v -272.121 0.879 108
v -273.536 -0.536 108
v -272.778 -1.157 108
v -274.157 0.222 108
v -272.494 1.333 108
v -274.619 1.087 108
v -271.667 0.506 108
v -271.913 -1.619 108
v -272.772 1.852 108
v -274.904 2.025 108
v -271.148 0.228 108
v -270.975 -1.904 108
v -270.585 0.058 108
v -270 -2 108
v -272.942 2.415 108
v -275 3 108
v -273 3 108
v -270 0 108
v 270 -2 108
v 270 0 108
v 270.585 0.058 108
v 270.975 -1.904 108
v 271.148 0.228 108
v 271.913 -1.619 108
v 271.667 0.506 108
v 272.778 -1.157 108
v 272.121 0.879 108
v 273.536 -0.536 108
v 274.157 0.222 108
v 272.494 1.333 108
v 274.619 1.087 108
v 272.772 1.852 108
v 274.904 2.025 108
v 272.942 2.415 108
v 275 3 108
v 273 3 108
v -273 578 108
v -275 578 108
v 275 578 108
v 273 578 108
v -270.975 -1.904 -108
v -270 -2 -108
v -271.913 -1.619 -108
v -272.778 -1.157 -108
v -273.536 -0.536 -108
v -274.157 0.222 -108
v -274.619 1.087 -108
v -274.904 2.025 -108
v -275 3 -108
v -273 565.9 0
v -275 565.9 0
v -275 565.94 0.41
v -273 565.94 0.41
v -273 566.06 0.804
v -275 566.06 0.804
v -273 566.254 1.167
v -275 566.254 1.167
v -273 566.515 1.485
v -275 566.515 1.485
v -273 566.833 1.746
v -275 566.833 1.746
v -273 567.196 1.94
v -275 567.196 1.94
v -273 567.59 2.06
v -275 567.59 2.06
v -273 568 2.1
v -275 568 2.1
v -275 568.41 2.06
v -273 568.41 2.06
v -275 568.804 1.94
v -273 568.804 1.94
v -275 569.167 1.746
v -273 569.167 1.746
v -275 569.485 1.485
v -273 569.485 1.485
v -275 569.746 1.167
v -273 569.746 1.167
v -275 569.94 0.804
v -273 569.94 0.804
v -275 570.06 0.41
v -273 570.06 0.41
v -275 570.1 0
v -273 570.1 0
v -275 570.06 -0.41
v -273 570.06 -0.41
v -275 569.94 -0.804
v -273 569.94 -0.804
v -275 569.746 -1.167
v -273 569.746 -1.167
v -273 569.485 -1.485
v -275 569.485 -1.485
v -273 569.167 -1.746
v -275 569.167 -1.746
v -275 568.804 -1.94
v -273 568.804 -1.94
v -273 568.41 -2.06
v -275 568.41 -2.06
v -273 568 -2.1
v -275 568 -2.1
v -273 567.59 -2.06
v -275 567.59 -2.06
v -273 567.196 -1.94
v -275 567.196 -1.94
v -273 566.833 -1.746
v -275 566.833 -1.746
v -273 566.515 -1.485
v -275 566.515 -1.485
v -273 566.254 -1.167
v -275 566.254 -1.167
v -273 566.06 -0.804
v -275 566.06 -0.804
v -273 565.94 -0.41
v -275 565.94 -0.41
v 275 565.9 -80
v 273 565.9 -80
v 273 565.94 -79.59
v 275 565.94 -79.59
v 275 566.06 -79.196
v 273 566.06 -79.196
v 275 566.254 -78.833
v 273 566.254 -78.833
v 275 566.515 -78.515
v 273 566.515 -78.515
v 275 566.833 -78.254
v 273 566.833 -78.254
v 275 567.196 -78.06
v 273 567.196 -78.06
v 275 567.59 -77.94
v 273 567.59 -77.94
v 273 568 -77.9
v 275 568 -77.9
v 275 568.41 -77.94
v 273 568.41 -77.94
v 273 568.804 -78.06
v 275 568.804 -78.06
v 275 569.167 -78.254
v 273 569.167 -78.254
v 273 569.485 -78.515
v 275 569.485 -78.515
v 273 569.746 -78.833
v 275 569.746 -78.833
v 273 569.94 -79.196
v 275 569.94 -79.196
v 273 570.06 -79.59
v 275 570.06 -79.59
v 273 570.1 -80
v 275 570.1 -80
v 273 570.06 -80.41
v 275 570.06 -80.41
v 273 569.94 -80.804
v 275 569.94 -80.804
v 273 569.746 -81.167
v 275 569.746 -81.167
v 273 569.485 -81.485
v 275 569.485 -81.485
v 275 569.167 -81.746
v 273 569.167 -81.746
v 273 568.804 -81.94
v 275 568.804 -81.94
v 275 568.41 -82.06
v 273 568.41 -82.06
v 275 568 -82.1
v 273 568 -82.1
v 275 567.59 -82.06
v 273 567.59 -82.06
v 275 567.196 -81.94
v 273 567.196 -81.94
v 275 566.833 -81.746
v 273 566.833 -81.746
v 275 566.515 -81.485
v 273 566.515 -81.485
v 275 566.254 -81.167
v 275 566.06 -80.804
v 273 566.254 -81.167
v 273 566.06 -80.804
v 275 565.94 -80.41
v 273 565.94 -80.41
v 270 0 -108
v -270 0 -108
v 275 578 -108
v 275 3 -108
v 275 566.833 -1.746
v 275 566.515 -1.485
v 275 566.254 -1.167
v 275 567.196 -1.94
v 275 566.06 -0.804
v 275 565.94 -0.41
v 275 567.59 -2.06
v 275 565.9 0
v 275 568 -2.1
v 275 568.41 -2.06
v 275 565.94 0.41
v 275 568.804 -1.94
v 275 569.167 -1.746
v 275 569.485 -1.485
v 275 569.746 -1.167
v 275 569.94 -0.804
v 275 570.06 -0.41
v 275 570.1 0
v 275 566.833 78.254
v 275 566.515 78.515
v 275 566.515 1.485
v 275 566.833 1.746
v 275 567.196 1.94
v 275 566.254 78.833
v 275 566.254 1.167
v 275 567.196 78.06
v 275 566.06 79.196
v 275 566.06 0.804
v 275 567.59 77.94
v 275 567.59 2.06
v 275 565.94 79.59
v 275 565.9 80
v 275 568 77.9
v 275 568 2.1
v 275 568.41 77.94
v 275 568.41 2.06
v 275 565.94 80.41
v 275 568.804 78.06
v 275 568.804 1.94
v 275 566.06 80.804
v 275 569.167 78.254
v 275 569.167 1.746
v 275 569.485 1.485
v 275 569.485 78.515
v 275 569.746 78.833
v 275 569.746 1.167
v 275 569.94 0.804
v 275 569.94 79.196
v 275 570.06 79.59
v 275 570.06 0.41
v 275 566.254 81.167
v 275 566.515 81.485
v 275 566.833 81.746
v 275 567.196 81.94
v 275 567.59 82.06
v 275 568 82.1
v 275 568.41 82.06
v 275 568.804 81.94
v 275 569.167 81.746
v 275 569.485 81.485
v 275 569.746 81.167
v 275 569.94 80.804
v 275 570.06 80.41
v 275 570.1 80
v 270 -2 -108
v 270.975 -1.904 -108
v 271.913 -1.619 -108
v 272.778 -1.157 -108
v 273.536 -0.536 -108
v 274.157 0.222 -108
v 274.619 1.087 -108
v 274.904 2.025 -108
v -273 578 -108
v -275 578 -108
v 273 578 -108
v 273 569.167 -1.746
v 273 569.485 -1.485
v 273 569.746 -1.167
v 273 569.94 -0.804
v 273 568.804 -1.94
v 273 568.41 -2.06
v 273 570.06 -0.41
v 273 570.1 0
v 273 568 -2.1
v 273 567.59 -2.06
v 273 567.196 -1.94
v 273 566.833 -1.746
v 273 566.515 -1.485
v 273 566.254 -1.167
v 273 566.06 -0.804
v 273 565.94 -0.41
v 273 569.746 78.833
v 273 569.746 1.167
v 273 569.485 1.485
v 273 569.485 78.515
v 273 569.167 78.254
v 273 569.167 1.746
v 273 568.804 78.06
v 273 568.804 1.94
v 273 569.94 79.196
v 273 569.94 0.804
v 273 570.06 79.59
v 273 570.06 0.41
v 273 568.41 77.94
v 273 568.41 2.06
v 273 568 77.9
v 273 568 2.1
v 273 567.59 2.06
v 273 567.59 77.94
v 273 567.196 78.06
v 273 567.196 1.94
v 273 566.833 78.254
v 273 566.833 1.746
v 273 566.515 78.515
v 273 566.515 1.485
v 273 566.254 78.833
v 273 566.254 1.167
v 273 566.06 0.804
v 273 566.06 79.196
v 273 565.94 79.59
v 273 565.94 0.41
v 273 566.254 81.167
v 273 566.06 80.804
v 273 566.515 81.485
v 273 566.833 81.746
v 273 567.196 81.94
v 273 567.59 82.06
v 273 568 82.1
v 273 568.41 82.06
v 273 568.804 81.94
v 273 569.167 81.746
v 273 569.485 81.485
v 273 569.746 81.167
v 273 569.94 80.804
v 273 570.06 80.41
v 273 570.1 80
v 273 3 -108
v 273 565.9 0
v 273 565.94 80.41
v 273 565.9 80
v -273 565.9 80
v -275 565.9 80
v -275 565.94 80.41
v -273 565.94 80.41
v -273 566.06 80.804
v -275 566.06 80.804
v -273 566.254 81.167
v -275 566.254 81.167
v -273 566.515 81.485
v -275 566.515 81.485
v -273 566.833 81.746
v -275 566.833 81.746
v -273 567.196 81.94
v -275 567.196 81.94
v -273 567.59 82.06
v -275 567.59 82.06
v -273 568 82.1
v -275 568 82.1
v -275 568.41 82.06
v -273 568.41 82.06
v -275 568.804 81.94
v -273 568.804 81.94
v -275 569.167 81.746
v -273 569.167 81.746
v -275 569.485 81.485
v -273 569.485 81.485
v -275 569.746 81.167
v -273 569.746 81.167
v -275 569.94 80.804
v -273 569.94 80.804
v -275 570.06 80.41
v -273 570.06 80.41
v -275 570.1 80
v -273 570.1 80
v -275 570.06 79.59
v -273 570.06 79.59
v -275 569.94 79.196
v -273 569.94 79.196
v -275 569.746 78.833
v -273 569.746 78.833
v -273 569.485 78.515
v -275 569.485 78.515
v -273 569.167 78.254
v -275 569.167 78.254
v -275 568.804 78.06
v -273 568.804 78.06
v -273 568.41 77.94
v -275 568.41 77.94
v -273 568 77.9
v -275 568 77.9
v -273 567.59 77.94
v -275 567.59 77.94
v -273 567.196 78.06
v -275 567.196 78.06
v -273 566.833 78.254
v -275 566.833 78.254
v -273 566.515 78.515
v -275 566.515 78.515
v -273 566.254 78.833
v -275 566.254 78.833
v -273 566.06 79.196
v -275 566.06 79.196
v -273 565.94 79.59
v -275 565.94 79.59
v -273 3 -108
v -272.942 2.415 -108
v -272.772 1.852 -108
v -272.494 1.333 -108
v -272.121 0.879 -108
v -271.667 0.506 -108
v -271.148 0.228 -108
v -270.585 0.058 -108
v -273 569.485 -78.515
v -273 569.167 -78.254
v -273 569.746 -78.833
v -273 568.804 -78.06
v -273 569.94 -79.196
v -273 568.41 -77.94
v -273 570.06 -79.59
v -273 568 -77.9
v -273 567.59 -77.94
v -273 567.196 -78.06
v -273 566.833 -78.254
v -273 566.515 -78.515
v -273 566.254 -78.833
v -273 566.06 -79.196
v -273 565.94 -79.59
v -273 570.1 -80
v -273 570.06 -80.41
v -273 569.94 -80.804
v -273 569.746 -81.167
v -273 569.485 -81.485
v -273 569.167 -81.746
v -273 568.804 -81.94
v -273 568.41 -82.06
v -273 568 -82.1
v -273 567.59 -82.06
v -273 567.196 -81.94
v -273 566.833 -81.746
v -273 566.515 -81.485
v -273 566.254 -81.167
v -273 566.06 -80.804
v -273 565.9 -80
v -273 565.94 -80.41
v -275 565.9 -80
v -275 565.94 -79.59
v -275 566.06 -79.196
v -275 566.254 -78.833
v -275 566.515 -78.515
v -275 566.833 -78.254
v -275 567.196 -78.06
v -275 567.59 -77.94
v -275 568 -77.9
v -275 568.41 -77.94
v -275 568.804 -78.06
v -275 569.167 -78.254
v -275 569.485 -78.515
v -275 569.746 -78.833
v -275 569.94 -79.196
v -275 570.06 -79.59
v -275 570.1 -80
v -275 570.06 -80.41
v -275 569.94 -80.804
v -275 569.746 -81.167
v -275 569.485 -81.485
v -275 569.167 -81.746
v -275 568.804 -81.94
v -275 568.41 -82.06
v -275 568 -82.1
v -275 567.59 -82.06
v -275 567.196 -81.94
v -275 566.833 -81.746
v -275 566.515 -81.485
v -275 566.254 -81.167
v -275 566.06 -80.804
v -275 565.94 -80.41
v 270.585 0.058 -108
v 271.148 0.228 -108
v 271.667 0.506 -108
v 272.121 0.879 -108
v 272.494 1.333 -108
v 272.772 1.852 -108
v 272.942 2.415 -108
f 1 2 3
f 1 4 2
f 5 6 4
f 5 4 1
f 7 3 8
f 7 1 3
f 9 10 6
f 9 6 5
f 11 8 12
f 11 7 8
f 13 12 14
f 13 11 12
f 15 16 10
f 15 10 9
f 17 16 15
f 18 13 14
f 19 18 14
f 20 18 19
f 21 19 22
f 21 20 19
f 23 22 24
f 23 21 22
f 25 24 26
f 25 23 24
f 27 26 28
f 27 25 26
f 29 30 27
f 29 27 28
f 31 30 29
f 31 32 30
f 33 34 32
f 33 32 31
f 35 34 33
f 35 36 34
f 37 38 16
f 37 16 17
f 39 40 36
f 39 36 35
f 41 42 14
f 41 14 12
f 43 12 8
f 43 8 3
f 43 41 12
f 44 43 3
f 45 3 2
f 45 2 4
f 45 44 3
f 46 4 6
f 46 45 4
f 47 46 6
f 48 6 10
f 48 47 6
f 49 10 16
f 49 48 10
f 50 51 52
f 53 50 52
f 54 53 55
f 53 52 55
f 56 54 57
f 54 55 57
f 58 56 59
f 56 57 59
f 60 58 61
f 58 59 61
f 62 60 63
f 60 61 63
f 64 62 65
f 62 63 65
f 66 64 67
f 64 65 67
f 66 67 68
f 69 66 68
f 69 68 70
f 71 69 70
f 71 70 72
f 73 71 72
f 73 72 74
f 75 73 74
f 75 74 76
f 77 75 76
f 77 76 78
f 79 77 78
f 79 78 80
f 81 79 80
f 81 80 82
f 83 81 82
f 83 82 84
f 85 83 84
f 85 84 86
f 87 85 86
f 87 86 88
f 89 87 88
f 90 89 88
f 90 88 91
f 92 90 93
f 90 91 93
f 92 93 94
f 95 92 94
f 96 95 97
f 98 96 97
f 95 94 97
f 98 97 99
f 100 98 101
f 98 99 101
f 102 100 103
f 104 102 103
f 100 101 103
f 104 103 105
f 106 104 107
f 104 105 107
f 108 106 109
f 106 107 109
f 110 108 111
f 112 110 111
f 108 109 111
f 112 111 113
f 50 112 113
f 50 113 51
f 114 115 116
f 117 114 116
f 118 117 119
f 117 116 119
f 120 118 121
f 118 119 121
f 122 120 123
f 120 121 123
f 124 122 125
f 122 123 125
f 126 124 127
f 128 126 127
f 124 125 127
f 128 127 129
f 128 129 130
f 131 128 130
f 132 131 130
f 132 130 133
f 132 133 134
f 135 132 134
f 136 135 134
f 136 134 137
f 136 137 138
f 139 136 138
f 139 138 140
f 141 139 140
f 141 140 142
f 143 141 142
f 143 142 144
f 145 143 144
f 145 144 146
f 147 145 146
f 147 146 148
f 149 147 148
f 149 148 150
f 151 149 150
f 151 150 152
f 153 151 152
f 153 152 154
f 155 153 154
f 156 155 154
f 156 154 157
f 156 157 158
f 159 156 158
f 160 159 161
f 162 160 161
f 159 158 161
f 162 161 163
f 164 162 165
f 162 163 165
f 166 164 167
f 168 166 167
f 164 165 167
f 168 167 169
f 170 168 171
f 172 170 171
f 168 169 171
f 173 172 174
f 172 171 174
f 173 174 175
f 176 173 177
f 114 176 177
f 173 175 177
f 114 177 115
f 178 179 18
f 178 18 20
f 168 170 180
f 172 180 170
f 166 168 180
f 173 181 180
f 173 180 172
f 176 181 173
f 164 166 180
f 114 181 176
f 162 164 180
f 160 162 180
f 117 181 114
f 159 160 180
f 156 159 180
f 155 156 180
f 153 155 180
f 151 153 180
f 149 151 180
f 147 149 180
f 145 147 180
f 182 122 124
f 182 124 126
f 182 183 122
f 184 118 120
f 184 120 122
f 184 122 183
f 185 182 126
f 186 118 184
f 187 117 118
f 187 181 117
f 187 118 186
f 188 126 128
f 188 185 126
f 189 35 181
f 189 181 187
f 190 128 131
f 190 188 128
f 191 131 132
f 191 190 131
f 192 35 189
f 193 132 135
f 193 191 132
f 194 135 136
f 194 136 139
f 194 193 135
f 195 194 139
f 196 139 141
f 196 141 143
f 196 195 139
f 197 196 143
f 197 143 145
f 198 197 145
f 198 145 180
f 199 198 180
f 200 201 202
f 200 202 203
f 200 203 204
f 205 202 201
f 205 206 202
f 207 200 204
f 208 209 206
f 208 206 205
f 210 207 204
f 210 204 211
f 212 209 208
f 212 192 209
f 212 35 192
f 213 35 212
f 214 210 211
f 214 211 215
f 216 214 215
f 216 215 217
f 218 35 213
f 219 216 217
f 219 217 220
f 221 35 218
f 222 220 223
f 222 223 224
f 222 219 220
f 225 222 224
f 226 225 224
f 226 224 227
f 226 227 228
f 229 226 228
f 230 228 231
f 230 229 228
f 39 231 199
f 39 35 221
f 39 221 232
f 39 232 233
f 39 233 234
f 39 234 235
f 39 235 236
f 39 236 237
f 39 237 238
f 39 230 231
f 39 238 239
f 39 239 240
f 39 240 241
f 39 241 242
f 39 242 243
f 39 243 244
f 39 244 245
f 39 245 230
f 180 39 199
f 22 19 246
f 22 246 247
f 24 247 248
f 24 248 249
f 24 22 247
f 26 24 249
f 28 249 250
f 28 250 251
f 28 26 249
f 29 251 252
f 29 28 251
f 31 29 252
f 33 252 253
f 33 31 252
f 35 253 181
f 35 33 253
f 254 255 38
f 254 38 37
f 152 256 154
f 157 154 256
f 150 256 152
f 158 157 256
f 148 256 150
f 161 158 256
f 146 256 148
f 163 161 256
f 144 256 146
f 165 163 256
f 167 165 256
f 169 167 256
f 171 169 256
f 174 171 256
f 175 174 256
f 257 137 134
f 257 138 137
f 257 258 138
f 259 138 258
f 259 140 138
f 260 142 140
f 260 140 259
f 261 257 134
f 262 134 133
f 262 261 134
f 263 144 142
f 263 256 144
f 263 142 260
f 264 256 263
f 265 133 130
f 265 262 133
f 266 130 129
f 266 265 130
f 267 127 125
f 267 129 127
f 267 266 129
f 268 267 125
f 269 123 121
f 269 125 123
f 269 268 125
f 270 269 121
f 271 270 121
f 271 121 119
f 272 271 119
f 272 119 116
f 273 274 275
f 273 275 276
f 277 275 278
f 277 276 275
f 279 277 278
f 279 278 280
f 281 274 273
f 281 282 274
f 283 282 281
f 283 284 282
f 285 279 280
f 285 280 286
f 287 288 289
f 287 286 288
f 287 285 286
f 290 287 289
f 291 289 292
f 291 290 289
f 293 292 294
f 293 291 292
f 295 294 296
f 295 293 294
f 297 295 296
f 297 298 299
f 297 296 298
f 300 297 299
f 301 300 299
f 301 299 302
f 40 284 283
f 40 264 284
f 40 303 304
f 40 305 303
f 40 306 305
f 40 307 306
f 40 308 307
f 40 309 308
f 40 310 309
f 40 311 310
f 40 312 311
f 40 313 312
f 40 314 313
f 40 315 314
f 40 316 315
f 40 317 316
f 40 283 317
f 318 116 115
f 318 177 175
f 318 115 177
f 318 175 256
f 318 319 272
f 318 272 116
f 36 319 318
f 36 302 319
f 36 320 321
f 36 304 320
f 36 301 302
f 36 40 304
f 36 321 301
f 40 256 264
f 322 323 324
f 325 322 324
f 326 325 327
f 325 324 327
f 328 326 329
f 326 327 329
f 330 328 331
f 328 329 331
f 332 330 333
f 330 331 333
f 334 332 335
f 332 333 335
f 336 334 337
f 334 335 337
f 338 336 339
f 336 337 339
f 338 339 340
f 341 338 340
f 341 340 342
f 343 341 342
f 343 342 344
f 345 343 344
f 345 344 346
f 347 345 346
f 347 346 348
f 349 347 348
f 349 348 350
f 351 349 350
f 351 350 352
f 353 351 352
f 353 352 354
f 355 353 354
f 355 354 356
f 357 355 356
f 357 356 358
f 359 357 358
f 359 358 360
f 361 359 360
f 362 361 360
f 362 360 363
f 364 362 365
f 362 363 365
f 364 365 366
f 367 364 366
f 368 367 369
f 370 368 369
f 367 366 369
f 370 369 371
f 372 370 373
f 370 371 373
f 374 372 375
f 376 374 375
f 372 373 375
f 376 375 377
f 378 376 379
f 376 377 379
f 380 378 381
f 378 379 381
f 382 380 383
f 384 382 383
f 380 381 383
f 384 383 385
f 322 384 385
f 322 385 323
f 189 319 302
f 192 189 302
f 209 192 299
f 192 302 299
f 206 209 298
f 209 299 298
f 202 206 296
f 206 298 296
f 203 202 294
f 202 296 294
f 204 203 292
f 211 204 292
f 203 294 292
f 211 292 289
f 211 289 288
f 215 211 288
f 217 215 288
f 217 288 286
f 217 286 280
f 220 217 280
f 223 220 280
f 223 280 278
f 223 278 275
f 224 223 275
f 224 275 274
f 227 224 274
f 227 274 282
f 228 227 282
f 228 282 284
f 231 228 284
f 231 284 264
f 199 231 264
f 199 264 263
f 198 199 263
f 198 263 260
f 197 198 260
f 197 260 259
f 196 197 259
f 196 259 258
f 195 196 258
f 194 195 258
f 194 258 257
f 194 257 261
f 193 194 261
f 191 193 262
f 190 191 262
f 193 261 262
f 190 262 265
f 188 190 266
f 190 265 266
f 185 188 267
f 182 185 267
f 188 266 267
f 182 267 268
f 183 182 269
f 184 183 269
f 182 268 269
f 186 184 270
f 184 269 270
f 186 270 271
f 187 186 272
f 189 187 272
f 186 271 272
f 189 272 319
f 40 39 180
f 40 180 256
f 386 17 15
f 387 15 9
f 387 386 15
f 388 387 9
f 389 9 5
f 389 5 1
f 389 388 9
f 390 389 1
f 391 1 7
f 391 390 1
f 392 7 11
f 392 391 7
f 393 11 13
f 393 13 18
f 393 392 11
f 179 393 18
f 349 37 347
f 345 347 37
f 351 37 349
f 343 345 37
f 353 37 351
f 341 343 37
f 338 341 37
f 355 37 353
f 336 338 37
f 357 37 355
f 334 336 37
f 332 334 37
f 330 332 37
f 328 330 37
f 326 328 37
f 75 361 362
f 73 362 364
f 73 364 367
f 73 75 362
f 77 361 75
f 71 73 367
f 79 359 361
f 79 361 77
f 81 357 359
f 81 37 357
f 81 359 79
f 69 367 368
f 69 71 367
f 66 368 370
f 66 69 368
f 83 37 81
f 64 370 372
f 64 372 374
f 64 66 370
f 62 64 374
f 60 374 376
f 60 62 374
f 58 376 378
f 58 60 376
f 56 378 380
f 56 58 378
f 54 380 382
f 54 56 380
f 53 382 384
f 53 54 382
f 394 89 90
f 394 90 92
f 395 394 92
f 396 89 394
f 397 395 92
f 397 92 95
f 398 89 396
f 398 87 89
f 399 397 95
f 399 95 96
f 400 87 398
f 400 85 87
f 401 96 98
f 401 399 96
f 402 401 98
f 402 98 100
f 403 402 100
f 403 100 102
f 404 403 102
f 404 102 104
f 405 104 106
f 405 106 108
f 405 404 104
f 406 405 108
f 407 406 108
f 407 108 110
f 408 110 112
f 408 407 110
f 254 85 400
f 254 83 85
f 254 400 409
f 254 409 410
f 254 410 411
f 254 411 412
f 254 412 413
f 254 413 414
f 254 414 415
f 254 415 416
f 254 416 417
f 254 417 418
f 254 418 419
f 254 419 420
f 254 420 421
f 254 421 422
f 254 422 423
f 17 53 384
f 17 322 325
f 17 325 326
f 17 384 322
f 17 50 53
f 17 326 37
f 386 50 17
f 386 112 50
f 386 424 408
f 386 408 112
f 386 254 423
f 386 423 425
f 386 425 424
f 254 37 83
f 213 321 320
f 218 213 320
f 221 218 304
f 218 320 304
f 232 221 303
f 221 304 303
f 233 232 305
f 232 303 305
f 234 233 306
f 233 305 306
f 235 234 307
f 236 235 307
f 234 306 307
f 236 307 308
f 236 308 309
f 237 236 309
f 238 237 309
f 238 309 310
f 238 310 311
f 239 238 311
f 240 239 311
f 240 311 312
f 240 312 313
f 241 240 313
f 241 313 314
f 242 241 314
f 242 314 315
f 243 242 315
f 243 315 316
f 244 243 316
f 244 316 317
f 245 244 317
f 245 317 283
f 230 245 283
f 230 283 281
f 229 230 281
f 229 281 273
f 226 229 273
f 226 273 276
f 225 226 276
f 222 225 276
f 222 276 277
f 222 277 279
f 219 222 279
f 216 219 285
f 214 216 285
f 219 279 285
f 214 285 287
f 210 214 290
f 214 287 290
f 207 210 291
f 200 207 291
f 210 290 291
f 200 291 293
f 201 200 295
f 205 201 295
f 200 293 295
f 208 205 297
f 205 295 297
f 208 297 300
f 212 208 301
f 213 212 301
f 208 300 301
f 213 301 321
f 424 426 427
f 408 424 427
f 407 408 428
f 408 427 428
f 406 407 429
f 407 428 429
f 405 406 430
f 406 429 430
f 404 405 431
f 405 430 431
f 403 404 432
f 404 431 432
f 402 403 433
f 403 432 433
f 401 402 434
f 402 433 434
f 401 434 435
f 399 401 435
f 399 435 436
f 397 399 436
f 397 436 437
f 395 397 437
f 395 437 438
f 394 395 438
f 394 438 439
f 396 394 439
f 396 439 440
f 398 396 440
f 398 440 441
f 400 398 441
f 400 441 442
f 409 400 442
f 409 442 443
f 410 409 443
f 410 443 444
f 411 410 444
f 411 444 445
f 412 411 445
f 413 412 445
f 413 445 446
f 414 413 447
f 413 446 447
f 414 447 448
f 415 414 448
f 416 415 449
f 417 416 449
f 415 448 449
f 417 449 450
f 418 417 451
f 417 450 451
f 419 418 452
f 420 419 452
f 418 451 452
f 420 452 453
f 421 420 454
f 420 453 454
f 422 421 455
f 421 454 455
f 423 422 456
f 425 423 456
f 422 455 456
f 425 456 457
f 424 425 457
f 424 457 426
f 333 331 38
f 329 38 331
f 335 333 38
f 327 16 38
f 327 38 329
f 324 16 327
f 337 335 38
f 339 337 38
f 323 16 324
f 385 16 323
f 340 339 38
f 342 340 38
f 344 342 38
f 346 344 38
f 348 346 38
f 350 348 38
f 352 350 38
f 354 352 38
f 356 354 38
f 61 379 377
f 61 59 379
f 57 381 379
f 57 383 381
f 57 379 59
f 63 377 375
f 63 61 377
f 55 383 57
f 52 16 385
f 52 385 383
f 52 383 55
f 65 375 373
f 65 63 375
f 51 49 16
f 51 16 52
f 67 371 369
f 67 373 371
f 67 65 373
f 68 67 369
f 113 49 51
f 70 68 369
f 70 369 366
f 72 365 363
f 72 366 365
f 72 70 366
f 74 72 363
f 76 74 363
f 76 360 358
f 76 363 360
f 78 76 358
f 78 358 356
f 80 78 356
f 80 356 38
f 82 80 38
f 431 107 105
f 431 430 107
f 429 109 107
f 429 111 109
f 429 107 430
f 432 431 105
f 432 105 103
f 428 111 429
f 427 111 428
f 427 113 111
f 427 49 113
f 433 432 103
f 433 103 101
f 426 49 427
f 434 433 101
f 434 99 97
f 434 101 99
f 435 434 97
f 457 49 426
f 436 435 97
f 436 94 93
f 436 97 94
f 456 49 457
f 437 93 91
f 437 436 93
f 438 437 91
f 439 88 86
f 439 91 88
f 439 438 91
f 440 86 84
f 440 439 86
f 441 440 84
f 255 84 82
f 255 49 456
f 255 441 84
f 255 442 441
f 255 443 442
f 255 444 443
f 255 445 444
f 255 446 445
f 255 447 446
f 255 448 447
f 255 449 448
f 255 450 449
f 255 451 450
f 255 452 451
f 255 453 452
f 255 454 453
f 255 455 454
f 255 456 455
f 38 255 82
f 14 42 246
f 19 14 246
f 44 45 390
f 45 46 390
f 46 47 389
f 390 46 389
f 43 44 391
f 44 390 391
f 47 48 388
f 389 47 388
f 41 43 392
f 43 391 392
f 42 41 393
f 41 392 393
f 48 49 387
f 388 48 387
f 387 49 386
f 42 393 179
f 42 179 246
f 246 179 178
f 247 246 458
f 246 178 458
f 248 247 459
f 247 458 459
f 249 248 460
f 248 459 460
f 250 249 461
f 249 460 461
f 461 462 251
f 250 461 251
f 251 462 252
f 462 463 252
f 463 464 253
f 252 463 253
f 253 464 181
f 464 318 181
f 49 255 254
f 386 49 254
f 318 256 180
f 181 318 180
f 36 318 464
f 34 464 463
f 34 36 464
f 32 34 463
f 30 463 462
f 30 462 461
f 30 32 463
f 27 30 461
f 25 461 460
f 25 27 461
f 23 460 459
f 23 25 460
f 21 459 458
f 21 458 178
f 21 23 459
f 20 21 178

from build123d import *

# Parameters (mm, degrees)
SZKIC1_W                             = 546
SZKIC1_H                             = 216
ODGI_CIE_BAZOWE1_DEPTH               = 2
ODGI_CIE_KRAW_DZI1_STRIP_W           = 14
ODGI_CIE_KRAW_DZI1_STRIP_H           = 2
ODGI_CIE_KRAW_DZI1_STRIP_CUT_DEPTH   = 216
ODGI_CIE_KRAW_DZI1_STRIP_2_W         = 14
ODGI_CIE_KRAW_DZI1_STRIP_2_H         = 2
ODGI_CIE_KRAW_DZI1_STRIP_CUT_2_DEPTH = 216
ODGI_CIE_KRAW_DZI1_DEPTH             = 216
ODGI_CIE_KRAW_DZI1_BEND_DEPTH        = 216
SZKIC12_R                            = 2.1
WYTNIJ_WYCI_GNI_CIE1_DEPTH           = 806.138497403


# Sheet-metal steps are written as plain solids
with BuildPart() as part:
    # Szkic1 → Odgięcie bazowe1 (new body)
    with BuildSketch(Plane(origin=(0, 0, 0), x_dir=(1, 0, 0), z_dir=(0, 1, 0))):
        Rectangle(SZKIC1_W, SZKIC1_H)
    extrude(amount=-ODGI_CIE_BAZOWE1_DEPTH)

    # Odgięcie krawędzi1 strip (across the edge) → Odgięcie krawędzi1 strip cut (cut)
    with BuildSketch(Plane(origin=(-273, 0, -108), x_dir=(1, 0, 0), z_dir=(0, 0, 1))):
        with Locations((-4, -1)):
            Rectangle(ODGI_CIE_KRAW_DZI1_STRIP_W, ODGI_CIE_KRAW_DZI1_STRIP_H)
    extrude(amount=ODGI_CIE_KRAW_DZI1_STRIP_CUT_DEPTH, mode=Mode.SUBTRACT)

    # Odgięcie krawędzi1 strip 2 (across the edge) → Odgięcie krawędzi1 strip cut 2 (cut)
    with BuildSketch(Plane(origin=(273, 0, 108), x_dir=(-1, 0, 0), z_dir=(0, 0, -1))):
        with Locations((-4, -1)):
            Rectangle(ODGI_CIE_KRAW_DZI1_STRIP_2_W, ODGI_CIE_KRAW_DZI1_STRIP_2_H)
    extrude(amount=ODGI_CIE_KRAW_DZI1_STRIP_CUT_2_DEPTH, mode=Mode.SUBTRACT)

    # Odgięcie krawędzi1 section (across the edge) → Odgięcie krawędzi1 (add)
    with BuildSketch(Plane(origin=(-273, 0, -108), x_dir=(1, 0, 0), z_dir=(0, 0, 1))):
        with BuildLine():
            Line((-2, 3), (-2, 578))
            Line((-2, 578), (0, 578))
            Line((0, 578), (0, 3))
            ThreePointArc((0, 3), (0.878679656, 0.878679656), (3, 0))
            Line((3, 0), (3, -2))
            ThreePointArc((3, -2), (-0.535533906, -0.535533906), (-2, 3))
        make_face()
    extrude(amount=ODGI_CIE_KRAW_DZI1_DEPTH)

    # Odgięcie krawędzi1 section 2 (across the edge) → Odgięcie krawędzi1 bend (add)
    with BuildSketch(Plane(origin=(273, 0, 108), x_dir=(-1, 0, 0), z_dir=(0, 0, -1))):
        with BuildLine():
            Line((-2, 3), (-2, 578))
            Line((-2, 578), (0, 578))
            Line((0, 578), (0, 3))
            ThreePointArc((0, 3), (0.878679656, 0.878679656), (3, 0))
            Line((3, 0), (3, -2))
            ThreePointArc((3, -2), (-0.535533906, -0.535533906), (-2, 3))
        make_face()
    extrude(amount=ODGI_CIE_KRAW_DZI1_BEND_DEPTH)

    # Szkic12 → Wytnij-wyciągnięcie1 (cut, through all)
    with BuildSketch(Plane.ZY.offset(275)):
        with Locations(Location((0, 568, 0), (0, 0, 270))):
            Circle(SZKIC12_R)
        with Locations(Location((80, 568, 0), (0, 0, 270))):
            Circle(SZKIC12_R)
        with Locations(Location((-80, 568, 0), (0, 0, 270))):
            Circle(SZKIC12_R)
    extrude(amount=-WYTNIJ_WYCI_GNI_CIE1_DEPTH, mode=Mode.SUBTRACT)


solid = part.part
